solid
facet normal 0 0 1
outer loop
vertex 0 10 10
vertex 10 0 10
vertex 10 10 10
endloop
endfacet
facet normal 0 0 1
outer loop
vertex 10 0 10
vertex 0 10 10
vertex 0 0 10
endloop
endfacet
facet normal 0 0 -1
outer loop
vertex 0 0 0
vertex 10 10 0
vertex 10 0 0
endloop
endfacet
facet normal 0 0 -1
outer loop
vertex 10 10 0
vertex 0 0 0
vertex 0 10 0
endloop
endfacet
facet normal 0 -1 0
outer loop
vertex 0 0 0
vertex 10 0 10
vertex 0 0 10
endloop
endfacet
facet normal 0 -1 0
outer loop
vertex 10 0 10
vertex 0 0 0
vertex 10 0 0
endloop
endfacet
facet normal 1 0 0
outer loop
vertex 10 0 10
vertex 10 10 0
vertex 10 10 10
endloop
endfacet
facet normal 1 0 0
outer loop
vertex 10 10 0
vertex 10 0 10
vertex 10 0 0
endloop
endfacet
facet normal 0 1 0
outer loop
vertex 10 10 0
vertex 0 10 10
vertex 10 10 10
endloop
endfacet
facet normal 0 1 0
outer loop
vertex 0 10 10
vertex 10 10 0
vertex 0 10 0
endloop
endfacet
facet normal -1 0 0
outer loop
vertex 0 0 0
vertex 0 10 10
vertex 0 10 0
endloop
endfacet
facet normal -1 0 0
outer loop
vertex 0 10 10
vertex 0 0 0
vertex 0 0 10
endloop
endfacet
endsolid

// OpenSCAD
module thefinger(){
linear_extrude(height=5, center=true, convexity = 10)
import (file = "newexport.dxf");
}
//square([2,2],center=true);
//import(file="TheGesture.dxf");
//import("TheGesture.dxf")
rotate([-90,0,0])translate([-16,-15,8])scale([0.25,0.25,1])thefinger();
difference(){
    translate([0,0,0])cube ([10,10,10]);
   %translate([4.65,-10,0])cube ([1,15,15]);
   %translate([5,5,0])cylinder(h = 20, r=1.2,$fn=30);
}
